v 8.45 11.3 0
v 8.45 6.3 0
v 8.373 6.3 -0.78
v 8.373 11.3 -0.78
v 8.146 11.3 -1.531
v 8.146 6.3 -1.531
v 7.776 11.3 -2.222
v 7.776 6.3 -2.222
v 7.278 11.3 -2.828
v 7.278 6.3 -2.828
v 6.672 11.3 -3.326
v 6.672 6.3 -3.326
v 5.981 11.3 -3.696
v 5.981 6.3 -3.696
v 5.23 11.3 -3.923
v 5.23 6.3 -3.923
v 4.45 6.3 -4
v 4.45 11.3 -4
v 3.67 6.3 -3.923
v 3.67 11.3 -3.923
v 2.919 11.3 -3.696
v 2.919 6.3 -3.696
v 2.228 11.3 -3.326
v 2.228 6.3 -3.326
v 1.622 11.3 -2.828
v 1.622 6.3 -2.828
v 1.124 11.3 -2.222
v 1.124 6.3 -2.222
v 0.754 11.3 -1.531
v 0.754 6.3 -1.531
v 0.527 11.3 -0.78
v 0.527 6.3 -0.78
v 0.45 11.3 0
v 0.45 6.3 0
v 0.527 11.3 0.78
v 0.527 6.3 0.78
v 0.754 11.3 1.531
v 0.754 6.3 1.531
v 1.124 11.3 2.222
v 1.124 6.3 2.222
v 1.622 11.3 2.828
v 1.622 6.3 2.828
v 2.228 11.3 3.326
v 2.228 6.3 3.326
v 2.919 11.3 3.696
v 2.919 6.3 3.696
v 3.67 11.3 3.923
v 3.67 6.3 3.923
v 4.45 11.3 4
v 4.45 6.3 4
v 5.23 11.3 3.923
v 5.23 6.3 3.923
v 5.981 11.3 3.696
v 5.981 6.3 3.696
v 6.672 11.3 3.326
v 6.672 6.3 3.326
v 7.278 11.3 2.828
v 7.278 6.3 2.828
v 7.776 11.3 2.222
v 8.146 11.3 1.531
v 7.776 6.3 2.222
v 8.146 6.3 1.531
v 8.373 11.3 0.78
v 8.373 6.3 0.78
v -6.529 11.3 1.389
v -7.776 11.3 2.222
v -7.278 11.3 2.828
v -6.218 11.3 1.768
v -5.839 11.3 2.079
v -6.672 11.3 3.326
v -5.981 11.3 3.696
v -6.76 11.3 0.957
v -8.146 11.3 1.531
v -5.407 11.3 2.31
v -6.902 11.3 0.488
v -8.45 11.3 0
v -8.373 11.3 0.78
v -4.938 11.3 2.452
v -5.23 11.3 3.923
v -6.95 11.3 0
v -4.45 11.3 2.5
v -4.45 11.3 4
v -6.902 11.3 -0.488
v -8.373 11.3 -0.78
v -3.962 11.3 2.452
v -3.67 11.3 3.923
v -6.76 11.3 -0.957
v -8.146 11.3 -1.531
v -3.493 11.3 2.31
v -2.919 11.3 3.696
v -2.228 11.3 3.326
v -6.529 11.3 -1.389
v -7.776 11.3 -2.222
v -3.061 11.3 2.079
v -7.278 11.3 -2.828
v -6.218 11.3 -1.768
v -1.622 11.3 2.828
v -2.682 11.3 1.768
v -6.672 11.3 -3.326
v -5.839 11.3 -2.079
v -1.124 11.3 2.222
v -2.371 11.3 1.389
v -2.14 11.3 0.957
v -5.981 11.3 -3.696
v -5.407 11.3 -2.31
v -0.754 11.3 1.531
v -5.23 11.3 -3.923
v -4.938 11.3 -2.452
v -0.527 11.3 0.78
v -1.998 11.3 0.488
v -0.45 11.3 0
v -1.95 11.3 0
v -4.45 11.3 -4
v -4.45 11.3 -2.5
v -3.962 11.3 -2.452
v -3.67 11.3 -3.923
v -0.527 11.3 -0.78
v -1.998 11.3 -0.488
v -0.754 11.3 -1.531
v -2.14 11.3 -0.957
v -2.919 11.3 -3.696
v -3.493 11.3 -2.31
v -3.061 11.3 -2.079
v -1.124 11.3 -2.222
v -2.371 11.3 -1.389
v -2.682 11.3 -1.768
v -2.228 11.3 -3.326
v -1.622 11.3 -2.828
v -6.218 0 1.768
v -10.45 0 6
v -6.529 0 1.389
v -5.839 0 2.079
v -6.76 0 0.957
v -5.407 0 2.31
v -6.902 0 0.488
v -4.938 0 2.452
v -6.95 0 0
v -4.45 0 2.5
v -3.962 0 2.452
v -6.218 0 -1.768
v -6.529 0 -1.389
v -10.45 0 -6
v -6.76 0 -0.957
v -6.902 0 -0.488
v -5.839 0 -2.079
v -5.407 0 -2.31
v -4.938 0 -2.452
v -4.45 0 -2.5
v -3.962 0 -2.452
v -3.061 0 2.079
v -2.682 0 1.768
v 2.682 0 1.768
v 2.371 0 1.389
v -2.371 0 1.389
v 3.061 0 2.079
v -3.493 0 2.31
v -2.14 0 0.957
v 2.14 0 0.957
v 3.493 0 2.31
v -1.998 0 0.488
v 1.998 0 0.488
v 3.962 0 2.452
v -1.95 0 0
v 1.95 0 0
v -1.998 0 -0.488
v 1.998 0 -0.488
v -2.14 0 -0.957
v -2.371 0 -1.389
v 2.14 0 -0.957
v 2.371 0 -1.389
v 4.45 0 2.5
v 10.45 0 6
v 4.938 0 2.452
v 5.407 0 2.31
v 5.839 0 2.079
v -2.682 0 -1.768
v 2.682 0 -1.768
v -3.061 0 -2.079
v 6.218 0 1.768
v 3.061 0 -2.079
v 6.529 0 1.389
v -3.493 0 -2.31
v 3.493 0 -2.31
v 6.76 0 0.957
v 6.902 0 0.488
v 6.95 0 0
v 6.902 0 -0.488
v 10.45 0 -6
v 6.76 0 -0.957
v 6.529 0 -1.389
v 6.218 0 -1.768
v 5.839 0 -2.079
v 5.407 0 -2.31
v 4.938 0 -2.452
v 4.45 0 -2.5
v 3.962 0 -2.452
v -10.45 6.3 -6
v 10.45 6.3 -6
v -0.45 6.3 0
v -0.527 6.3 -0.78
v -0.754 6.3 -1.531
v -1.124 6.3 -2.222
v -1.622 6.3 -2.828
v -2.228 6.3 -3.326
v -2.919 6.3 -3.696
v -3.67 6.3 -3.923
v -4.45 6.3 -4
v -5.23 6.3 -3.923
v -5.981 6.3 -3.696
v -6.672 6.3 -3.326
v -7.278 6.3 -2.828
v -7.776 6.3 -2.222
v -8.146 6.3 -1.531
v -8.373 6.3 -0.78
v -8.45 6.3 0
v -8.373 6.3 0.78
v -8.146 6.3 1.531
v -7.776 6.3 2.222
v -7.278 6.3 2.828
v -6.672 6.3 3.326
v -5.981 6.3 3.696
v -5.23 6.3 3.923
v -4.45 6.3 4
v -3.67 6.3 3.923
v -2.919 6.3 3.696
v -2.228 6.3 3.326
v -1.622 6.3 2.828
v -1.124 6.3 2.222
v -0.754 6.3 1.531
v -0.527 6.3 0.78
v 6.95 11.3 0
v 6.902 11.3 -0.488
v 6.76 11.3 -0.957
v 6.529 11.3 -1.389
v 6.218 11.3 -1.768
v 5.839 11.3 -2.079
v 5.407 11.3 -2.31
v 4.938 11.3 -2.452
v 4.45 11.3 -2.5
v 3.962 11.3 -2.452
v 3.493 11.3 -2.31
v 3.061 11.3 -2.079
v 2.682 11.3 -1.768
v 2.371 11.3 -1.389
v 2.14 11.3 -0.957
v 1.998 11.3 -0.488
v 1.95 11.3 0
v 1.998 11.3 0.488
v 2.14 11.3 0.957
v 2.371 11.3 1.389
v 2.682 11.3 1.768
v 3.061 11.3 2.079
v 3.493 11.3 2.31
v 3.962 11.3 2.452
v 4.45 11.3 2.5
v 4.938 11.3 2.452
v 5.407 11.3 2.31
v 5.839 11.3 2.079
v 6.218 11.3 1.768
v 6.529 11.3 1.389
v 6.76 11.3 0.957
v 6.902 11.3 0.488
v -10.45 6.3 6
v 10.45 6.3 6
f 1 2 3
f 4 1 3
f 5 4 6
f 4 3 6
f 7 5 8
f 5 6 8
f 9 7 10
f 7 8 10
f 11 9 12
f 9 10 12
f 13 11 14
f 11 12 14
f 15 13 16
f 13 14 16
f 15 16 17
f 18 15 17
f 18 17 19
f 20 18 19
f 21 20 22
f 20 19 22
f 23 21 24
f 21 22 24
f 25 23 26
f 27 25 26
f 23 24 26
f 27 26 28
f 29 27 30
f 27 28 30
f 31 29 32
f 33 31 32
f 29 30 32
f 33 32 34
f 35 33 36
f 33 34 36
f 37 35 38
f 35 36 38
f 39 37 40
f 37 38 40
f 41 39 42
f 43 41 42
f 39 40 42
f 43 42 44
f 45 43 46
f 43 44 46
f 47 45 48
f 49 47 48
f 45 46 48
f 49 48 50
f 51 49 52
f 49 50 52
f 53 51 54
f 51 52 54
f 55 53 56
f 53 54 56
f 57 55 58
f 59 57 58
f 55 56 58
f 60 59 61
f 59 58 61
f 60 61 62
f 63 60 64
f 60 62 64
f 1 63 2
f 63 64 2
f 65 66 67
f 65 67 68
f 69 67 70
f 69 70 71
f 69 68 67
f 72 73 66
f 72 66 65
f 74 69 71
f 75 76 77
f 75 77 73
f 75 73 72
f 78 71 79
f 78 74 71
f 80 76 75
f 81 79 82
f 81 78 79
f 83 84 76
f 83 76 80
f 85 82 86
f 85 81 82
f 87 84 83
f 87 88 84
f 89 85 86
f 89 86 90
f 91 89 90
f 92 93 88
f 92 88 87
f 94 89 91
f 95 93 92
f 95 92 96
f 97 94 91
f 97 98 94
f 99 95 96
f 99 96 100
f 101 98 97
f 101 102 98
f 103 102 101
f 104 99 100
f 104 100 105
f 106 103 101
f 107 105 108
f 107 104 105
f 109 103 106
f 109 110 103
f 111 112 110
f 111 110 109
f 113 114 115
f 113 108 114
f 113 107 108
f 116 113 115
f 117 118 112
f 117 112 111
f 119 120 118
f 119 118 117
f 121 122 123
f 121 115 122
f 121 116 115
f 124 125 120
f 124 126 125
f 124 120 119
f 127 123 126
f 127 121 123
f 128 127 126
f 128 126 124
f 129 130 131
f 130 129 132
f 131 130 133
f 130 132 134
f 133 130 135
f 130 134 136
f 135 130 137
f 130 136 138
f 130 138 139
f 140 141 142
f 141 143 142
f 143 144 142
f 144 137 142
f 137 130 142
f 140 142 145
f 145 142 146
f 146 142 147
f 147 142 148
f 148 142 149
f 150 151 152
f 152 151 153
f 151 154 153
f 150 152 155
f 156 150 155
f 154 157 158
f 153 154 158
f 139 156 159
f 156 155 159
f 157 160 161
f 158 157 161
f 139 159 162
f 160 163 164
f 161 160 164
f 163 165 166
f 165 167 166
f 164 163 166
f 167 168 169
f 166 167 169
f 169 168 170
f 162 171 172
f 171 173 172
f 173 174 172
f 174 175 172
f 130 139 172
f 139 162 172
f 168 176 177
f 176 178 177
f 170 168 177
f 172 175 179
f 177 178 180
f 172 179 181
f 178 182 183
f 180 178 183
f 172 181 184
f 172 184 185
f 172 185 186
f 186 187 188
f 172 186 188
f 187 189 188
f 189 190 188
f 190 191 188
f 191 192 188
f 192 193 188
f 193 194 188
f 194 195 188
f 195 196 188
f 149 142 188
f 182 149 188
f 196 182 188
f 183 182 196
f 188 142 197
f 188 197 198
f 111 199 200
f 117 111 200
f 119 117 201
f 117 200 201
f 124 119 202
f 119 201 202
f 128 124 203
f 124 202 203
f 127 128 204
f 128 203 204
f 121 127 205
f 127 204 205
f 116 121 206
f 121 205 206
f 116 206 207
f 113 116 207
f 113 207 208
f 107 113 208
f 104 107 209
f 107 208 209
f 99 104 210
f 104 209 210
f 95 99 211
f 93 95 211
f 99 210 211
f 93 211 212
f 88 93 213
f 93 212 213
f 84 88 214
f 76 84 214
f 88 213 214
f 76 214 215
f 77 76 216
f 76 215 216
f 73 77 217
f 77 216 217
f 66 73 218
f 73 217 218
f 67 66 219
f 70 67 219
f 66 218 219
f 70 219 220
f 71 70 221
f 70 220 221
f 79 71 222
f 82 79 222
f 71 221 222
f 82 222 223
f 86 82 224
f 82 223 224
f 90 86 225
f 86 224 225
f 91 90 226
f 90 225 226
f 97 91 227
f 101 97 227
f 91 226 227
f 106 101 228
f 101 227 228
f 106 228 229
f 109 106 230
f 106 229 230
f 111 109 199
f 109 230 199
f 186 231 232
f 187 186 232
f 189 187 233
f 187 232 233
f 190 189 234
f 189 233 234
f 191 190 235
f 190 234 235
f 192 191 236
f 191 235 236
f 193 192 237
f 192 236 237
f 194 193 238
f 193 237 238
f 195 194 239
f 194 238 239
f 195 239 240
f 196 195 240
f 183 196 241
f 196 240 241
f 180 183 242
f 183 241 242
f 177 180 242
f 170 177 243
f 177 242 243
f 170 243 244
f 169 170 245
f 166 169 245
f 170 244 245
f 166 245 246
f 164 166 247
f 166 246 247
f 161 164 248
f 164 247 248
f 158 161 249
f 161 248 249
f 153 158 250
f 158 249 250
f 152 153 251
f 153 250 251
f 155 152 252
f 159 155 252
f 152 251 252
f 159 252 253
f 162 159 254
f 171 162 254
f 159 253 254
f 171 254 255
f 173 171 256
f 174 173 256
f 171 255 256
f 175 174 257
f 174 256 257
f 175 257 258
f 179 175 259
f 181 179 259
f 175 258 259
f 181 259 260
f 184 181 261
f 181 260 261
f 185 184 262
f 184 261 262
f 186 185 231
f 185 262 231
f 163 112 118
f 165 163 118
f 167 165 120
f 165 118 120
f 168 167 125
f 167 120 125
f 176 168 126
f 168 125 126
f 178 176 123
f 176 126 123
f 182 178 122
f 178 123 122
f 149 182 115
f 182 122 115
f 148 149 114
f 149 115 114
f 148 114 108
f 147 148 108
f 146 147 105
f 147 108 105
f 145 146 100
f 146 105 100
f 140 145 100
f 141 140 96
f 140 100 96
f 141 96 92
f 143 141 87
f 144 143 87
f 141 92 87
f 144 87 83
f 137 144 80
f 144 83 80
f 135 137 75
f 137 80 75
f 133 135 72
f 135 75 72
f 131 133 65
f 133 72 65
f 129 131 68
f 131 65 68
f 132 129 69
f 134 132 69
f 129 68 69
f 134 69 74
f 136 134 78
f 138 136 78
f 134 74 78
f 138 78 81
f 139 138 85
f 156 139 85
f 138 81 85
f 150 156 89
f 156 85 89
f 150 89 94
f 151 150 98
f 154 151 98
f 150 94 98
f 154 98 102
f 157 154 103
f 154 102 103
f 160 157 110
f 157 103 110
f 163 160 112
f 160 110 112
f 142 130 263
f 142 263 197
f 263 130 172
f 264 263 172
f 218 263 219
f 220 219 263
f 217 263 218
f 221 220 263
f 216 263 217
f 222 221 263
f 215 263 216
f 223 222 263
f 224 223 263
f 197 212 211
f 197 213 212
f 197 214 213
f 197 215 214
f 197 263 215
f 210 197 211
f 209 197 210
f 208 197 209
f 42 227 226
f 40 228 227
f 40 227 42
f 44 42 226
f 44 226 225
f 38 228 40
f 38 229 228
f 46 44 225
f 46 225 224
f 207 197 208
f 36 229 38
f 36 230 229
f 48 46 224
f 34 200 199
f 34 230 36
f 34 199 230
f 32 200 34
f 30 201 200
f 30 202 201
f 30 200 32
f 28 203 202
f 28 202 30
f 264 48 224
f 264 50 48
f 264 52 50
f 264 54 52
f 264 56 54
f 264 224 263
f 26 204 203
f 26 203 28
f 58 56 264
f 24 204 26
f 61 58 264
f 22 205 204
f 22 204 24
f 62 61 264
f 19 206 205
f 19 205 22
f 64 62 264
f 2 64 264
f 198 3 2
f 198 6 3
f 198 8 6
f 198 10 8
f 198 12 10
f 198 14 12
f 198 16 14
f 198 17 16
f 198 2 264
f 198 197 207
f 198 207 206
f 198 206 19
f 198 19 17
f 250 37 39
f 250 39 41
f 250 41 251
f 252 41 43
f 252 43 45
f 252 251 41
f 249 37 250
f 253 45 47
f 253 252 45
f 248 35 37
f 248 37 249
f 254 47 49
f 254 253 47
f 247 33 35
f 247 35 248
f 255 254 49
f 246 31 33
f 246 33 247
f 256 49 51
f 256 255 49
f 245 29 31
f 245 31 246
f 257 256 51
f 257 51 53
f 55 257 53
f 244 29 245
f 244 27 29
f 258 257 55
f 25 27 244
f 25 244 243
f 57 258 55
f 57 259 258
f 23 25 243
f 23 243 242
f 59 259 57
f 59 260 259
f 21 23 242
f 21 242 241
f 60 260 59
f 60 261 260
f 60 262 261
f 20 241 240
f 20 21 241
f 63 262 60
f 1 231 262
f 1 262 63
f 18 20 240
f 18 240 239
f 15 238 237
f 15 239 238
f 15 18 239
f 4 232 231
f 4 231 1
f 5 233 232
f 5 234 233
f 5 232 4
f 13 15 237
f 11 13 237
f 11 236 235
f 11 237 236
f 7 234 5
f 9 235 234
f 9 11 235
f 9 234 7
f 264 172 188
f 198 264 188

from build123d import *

# Parameters (mm, degrees)
SKETCH1_W           = 20.9
SKETCH1_H           = 12
BOSS_EXTRUDE1_DEPTH = 6.3
SKETCH2_R           = 4
BOSS_EXTRUDE2_DEPTH = 5
SKETCH3_R           = 2.5
CUT_EXTRUDE1_DEPTH  = 11.3


with BuildPart() as part:
    # Sketch1 → Boss-Extrude1 (new body)
    with BuildSketch(Plane(origin=(0, 0, 0), x_dir=(1, 0, 0), z_dir=(0, 1, 0))):
        Rectangle(SKETCH1_W, SKETCH1_H)
    extrude(amount=BOSS_EXTRUDE1_DEPTH)

    # Sketch2 → Boss-Extrude2 (add)
    with BuildSketch(Plane(origin=(0, 6.3, 0), x_dir=(1, 0, 0), z_dir=(0, 1, 0))):
        with Locations((-4.45, 0)):
            Circle(SKETCH2_R)
        with Locations((4.45, 0)):
            Circle(SKETCH2_R)
    extrude(amount=BOSS_EXTRUDE2_DEPTH)

    # Sketch3 → Cut-Extrude1 (cut)
    with BuildSketch(Plane(origin=(0, 11.3, 0), x_dir=(1, 0, 0), z_dir=(0, 1, 0))):
        with Locations((4.45, 0)):
            Circle(SKETCH3_R)
        with Locations((-4.45, 0)):
            Circle(SKETCH3_R)
    extrude(amount=-CUT_EXTRUDE1_DEPTH, mode=Mode.SUBTRACT)


solid = part.part
